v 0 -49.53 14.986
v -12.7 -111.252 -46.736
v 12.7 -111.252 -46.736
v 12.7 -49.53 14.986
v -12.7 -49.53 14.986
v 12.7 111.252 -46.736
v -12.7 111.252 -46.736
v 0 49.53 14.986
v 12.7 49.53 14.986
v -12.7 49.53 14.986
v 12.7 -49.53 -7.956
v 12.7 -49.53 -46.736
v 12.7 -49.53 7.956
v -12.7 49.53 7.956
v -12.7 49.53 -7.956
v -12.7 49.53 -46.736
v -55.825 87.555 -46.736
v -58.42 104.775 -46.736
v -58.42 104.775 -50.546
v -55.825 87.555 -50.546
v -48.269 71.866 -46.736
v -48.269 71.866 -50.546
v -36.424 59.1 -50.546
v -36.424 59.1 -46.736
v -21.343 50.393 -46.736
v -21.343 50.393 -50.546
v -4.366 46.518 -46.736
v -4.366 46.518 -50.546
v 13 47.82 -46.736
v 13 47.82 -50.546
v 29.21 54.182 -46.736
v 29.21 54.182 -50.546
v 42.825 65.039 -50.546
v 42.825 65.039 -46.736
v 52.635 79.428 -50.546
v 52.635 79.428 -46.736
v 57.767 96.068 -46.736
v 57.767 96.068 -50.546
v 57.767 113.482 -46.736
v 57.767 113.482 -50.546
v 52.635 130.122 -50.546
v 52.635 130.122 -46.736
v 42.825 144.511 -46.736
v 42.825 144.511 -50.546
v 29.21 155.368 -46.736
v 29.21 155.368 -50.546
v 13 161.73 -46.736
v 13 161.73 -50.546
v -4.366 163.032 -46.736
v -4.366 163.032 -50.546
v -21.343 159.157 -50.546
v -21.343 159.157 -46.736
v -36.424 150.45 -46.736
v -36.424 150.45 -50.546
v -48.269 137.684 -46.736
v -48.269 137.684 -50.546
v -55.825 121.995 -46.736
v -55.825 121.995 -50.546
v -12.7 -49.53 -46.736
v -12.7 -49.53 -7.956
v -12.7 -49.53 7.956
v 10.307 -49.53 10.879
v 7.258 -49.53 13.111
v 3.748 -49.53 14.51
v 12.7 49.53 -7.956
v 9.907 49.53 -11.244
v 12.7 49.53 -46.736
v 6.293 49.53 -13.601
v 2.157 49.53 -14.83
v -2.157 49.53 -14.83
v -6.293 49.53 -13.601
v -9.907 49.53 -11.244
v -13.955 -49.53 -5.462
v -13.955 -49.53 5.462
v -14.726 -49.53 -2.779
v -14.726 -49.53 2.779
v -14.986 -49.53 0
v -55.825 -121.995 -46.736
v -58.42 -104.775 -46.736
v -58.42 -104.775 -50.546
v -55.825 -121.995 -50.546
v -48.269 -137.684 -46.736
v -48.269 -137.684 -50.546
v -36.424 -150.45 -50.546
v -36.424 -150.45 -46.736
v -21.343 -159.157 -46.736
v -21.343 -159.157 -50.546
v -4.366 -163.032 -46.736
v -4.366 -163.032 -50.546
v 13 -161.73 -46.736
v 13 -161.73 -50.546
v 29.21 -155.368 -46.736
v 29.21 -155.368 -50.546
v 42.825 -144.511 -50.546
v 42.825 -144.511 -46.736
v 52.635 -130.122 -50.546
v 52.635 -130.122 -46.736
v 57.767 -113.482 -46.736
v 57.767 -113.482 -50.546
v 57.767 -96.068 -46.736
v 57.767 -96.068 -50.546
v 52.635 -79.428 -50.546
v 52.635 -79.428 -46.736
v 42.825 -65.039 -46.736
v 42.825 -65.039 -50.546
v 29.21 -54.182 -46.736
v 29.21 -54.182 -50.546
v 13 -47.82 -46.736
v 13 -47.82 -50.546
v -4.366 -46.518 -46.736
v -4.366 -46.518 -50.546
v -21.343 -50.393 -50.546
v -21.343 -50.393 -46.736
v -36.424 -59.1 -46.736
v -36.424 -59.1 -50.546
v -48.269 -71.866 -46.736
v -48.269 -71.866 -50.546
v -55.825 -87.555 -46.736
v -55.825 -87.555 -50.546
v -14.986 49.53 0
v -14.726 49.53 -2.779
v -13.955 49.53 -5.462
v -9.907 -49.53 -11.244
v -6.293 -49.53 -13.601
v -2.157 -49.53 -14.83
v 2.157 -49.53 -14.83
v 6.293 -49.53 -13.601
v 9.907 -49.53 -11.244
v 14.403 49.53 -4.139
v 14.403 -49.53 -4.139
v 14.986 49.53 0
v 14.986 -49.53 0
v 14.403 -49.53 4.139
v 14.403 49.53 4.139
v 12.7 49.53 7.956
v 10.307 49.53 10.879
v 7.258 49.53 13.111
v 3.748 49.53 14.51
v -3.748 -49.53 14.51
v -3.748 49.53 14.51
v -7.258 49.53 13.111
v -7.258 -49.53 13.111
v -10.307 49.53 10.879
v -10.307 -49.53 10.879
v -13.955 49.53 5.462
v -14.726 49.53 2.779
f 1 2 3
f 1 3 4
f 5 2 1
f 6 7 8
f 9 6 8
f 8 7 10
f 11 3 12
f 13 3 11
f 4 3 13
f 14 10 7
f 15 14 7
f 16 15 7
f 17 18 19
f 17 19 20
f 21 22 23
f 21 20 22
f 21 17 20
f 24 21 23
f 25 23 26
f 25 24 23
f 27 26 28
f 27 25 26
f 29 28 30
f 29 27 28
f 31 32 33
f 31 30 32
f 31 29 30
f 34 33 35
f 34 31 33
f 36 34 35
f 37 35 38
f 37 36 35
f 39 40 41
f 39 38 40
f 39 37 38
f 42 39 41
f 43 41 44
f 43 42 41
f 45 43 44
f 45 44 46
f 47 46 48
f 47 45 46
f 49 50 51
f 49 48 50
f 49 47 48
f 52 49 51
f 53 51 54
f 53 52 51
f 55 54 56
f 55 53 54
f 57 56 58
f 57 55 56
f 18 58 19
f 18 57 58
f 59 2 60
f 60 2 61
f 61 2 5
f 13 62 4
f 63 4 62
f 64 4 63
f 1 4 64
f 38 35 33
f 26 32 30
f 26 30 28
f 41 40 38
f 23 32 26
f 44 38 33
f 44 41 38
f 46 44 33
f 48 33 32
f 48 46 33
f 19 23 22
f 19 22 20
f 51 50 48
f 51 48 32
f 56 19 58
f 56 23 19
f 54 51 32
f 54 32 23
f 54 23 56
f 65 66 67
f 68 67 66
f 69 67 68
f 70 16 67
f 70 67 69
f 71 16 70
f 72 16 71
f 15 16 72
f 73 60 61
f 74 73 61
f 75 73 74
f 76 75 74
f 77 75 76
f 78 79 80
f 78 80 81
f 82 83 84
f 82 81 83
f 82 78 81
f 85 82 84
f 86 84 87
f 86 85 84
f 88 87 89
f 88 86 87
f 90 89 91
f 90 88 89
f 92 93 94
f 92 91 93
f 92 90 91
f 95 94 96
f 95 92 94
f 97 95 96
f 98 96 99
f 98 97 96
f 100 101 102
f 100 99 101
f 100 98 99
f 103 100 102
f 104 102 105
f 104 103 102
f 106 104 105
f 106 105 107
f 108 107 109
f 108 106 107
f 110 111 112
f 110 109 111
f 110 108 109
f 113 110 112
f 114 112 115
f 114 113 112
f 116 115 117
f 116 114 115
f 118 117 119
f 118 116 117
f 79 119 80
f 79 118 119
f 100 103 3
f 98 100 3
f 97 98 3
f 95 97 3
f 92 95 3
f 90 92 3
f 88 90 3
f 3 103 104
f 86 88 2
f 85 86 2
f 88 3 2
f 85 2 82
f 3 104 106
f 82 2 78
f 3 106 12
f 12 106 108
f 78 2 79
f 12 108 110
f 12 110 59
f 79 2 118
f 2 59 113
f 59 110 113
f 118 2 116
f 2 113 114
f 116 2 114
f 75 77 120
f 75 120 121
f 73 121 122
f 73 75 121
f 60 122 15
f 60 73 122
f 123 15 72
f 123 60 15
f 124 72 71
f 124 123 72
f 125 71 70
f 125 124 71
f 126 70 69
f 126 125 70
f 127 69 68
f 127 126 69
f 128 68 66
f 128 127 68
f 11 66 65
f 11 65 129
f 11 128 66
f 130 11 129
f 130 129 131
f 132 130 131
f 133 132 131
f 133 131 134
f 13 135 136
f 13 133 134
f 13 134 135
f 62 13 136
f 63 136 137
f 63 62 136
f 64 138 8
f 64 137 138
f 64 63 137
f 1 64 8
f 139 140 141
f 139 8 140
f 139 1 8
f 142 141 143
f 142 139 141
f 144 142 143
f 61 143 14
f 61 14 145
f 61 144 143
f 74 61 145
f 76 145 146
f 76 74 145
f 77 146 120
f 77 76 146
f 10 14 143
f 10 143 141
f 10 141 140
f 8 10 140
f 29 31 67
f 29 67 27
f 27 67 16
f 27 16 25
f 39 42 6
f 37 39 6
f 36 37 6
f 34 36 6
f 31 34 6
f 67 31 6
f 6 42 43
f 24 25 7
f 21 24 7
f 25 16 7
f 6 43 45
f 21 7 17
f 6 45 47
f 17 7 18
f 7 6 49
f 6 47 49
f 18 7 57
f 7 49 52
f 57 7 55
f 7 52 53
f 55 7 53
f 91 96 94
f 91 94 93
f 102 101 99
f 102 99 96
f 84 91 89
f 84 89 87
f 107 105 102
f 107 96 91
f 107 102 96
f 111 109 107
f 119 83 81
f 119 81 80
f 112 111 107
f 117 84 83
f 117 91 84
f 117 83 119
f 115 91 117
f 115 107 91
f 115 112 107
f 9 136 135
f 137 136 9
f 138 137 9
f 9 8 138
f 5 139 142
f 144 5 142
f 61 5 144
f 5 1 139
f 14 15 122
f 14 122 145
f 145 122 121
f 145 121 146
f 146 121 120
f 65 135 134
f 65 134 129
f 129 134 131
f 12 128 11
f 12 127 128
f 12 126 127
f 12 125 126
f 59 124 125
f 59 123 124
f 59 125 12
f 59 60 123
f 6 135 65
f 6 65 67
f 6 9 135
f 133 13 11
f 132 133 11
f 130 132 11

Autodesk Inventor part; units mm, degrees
ref_plane "YZ Plane" through (0, 0, 0) normal (1, 0, 0) x (0, 1, 0)
ref_plane "XZ Plane" through (0, 0, 0) normal (0, 1, 0) x (-1, 0, 0)
ref_plane "XY Plane" through (0, 0, 0) normal (0, 0, 1) x (1, 0, 0)
sketch "Sketch1" plane through (0, 0, 0) normal (0, 1, 0) x (-1, 0, 0)
  circle A0 centre (0, 0) radius 14.986
  dimension "d0" = 29.972
extrude "Extrusion1" add sketch "Sketch1" along normal mid plane 99.06
sketch "Sketch2" plane through (0, 0, 0) normal (1, 0, 0) x (0, 1, 0)
  line L0 (-49.53, 14.986) -> (-49.53, -14.986) projected
  line L1 (49.53, -14.986) -> (49.53, 14.986) projected
  line L2 (0, 14.986) -> (0, -71.9195) construction
  line L3 (49.53, 14.986) -> (49.53, -46.736)
  line L4 (49.53, -46.736) -> (111.252, -46.736)
  line L5 (111.252, -46.736) -> (49.53, 14.986)
  line L6 (-49.53, -14.986) -> (-49.53, 14.986)
  line L7 (-49.53, 14.986) -> (-49.53, -46.736)
  line L8 (-49.53, -46.736) -> (-111.252, -46.736)
  line L9 (-111.252, -46.736) -> (-49.53, 14.986)
  point P0 (0, 0)
  dimension "d3" = 61.722
  dimension "d4" = 61.722
extrude "Extrusion2" add sketch "Sketch2" along normal mid plane 25.4
sketch "Sketch3" plane through (12.7, 111.252, -46.736) normal (0, 0, -1) x (-1, 0, 0)
  line L0 (12.7, -111.252) -> (12.7, -6.477) construction
  circle A0 centre (12.7, -6.477) radius 58.42
  line L1 (12.7, -111.252) -> (-79.2707, -111.252) construction
  circle A1 centre (12.7, -216.027) radius 58.42
  dimension "d7" = 104.775
  dimension "d8" = 116.84
extrude "Extrusion3" add sketch "Sketch3" along normal blind 3.81
equation "\"d4\" = d3"
properties part number "SuctionCup"
